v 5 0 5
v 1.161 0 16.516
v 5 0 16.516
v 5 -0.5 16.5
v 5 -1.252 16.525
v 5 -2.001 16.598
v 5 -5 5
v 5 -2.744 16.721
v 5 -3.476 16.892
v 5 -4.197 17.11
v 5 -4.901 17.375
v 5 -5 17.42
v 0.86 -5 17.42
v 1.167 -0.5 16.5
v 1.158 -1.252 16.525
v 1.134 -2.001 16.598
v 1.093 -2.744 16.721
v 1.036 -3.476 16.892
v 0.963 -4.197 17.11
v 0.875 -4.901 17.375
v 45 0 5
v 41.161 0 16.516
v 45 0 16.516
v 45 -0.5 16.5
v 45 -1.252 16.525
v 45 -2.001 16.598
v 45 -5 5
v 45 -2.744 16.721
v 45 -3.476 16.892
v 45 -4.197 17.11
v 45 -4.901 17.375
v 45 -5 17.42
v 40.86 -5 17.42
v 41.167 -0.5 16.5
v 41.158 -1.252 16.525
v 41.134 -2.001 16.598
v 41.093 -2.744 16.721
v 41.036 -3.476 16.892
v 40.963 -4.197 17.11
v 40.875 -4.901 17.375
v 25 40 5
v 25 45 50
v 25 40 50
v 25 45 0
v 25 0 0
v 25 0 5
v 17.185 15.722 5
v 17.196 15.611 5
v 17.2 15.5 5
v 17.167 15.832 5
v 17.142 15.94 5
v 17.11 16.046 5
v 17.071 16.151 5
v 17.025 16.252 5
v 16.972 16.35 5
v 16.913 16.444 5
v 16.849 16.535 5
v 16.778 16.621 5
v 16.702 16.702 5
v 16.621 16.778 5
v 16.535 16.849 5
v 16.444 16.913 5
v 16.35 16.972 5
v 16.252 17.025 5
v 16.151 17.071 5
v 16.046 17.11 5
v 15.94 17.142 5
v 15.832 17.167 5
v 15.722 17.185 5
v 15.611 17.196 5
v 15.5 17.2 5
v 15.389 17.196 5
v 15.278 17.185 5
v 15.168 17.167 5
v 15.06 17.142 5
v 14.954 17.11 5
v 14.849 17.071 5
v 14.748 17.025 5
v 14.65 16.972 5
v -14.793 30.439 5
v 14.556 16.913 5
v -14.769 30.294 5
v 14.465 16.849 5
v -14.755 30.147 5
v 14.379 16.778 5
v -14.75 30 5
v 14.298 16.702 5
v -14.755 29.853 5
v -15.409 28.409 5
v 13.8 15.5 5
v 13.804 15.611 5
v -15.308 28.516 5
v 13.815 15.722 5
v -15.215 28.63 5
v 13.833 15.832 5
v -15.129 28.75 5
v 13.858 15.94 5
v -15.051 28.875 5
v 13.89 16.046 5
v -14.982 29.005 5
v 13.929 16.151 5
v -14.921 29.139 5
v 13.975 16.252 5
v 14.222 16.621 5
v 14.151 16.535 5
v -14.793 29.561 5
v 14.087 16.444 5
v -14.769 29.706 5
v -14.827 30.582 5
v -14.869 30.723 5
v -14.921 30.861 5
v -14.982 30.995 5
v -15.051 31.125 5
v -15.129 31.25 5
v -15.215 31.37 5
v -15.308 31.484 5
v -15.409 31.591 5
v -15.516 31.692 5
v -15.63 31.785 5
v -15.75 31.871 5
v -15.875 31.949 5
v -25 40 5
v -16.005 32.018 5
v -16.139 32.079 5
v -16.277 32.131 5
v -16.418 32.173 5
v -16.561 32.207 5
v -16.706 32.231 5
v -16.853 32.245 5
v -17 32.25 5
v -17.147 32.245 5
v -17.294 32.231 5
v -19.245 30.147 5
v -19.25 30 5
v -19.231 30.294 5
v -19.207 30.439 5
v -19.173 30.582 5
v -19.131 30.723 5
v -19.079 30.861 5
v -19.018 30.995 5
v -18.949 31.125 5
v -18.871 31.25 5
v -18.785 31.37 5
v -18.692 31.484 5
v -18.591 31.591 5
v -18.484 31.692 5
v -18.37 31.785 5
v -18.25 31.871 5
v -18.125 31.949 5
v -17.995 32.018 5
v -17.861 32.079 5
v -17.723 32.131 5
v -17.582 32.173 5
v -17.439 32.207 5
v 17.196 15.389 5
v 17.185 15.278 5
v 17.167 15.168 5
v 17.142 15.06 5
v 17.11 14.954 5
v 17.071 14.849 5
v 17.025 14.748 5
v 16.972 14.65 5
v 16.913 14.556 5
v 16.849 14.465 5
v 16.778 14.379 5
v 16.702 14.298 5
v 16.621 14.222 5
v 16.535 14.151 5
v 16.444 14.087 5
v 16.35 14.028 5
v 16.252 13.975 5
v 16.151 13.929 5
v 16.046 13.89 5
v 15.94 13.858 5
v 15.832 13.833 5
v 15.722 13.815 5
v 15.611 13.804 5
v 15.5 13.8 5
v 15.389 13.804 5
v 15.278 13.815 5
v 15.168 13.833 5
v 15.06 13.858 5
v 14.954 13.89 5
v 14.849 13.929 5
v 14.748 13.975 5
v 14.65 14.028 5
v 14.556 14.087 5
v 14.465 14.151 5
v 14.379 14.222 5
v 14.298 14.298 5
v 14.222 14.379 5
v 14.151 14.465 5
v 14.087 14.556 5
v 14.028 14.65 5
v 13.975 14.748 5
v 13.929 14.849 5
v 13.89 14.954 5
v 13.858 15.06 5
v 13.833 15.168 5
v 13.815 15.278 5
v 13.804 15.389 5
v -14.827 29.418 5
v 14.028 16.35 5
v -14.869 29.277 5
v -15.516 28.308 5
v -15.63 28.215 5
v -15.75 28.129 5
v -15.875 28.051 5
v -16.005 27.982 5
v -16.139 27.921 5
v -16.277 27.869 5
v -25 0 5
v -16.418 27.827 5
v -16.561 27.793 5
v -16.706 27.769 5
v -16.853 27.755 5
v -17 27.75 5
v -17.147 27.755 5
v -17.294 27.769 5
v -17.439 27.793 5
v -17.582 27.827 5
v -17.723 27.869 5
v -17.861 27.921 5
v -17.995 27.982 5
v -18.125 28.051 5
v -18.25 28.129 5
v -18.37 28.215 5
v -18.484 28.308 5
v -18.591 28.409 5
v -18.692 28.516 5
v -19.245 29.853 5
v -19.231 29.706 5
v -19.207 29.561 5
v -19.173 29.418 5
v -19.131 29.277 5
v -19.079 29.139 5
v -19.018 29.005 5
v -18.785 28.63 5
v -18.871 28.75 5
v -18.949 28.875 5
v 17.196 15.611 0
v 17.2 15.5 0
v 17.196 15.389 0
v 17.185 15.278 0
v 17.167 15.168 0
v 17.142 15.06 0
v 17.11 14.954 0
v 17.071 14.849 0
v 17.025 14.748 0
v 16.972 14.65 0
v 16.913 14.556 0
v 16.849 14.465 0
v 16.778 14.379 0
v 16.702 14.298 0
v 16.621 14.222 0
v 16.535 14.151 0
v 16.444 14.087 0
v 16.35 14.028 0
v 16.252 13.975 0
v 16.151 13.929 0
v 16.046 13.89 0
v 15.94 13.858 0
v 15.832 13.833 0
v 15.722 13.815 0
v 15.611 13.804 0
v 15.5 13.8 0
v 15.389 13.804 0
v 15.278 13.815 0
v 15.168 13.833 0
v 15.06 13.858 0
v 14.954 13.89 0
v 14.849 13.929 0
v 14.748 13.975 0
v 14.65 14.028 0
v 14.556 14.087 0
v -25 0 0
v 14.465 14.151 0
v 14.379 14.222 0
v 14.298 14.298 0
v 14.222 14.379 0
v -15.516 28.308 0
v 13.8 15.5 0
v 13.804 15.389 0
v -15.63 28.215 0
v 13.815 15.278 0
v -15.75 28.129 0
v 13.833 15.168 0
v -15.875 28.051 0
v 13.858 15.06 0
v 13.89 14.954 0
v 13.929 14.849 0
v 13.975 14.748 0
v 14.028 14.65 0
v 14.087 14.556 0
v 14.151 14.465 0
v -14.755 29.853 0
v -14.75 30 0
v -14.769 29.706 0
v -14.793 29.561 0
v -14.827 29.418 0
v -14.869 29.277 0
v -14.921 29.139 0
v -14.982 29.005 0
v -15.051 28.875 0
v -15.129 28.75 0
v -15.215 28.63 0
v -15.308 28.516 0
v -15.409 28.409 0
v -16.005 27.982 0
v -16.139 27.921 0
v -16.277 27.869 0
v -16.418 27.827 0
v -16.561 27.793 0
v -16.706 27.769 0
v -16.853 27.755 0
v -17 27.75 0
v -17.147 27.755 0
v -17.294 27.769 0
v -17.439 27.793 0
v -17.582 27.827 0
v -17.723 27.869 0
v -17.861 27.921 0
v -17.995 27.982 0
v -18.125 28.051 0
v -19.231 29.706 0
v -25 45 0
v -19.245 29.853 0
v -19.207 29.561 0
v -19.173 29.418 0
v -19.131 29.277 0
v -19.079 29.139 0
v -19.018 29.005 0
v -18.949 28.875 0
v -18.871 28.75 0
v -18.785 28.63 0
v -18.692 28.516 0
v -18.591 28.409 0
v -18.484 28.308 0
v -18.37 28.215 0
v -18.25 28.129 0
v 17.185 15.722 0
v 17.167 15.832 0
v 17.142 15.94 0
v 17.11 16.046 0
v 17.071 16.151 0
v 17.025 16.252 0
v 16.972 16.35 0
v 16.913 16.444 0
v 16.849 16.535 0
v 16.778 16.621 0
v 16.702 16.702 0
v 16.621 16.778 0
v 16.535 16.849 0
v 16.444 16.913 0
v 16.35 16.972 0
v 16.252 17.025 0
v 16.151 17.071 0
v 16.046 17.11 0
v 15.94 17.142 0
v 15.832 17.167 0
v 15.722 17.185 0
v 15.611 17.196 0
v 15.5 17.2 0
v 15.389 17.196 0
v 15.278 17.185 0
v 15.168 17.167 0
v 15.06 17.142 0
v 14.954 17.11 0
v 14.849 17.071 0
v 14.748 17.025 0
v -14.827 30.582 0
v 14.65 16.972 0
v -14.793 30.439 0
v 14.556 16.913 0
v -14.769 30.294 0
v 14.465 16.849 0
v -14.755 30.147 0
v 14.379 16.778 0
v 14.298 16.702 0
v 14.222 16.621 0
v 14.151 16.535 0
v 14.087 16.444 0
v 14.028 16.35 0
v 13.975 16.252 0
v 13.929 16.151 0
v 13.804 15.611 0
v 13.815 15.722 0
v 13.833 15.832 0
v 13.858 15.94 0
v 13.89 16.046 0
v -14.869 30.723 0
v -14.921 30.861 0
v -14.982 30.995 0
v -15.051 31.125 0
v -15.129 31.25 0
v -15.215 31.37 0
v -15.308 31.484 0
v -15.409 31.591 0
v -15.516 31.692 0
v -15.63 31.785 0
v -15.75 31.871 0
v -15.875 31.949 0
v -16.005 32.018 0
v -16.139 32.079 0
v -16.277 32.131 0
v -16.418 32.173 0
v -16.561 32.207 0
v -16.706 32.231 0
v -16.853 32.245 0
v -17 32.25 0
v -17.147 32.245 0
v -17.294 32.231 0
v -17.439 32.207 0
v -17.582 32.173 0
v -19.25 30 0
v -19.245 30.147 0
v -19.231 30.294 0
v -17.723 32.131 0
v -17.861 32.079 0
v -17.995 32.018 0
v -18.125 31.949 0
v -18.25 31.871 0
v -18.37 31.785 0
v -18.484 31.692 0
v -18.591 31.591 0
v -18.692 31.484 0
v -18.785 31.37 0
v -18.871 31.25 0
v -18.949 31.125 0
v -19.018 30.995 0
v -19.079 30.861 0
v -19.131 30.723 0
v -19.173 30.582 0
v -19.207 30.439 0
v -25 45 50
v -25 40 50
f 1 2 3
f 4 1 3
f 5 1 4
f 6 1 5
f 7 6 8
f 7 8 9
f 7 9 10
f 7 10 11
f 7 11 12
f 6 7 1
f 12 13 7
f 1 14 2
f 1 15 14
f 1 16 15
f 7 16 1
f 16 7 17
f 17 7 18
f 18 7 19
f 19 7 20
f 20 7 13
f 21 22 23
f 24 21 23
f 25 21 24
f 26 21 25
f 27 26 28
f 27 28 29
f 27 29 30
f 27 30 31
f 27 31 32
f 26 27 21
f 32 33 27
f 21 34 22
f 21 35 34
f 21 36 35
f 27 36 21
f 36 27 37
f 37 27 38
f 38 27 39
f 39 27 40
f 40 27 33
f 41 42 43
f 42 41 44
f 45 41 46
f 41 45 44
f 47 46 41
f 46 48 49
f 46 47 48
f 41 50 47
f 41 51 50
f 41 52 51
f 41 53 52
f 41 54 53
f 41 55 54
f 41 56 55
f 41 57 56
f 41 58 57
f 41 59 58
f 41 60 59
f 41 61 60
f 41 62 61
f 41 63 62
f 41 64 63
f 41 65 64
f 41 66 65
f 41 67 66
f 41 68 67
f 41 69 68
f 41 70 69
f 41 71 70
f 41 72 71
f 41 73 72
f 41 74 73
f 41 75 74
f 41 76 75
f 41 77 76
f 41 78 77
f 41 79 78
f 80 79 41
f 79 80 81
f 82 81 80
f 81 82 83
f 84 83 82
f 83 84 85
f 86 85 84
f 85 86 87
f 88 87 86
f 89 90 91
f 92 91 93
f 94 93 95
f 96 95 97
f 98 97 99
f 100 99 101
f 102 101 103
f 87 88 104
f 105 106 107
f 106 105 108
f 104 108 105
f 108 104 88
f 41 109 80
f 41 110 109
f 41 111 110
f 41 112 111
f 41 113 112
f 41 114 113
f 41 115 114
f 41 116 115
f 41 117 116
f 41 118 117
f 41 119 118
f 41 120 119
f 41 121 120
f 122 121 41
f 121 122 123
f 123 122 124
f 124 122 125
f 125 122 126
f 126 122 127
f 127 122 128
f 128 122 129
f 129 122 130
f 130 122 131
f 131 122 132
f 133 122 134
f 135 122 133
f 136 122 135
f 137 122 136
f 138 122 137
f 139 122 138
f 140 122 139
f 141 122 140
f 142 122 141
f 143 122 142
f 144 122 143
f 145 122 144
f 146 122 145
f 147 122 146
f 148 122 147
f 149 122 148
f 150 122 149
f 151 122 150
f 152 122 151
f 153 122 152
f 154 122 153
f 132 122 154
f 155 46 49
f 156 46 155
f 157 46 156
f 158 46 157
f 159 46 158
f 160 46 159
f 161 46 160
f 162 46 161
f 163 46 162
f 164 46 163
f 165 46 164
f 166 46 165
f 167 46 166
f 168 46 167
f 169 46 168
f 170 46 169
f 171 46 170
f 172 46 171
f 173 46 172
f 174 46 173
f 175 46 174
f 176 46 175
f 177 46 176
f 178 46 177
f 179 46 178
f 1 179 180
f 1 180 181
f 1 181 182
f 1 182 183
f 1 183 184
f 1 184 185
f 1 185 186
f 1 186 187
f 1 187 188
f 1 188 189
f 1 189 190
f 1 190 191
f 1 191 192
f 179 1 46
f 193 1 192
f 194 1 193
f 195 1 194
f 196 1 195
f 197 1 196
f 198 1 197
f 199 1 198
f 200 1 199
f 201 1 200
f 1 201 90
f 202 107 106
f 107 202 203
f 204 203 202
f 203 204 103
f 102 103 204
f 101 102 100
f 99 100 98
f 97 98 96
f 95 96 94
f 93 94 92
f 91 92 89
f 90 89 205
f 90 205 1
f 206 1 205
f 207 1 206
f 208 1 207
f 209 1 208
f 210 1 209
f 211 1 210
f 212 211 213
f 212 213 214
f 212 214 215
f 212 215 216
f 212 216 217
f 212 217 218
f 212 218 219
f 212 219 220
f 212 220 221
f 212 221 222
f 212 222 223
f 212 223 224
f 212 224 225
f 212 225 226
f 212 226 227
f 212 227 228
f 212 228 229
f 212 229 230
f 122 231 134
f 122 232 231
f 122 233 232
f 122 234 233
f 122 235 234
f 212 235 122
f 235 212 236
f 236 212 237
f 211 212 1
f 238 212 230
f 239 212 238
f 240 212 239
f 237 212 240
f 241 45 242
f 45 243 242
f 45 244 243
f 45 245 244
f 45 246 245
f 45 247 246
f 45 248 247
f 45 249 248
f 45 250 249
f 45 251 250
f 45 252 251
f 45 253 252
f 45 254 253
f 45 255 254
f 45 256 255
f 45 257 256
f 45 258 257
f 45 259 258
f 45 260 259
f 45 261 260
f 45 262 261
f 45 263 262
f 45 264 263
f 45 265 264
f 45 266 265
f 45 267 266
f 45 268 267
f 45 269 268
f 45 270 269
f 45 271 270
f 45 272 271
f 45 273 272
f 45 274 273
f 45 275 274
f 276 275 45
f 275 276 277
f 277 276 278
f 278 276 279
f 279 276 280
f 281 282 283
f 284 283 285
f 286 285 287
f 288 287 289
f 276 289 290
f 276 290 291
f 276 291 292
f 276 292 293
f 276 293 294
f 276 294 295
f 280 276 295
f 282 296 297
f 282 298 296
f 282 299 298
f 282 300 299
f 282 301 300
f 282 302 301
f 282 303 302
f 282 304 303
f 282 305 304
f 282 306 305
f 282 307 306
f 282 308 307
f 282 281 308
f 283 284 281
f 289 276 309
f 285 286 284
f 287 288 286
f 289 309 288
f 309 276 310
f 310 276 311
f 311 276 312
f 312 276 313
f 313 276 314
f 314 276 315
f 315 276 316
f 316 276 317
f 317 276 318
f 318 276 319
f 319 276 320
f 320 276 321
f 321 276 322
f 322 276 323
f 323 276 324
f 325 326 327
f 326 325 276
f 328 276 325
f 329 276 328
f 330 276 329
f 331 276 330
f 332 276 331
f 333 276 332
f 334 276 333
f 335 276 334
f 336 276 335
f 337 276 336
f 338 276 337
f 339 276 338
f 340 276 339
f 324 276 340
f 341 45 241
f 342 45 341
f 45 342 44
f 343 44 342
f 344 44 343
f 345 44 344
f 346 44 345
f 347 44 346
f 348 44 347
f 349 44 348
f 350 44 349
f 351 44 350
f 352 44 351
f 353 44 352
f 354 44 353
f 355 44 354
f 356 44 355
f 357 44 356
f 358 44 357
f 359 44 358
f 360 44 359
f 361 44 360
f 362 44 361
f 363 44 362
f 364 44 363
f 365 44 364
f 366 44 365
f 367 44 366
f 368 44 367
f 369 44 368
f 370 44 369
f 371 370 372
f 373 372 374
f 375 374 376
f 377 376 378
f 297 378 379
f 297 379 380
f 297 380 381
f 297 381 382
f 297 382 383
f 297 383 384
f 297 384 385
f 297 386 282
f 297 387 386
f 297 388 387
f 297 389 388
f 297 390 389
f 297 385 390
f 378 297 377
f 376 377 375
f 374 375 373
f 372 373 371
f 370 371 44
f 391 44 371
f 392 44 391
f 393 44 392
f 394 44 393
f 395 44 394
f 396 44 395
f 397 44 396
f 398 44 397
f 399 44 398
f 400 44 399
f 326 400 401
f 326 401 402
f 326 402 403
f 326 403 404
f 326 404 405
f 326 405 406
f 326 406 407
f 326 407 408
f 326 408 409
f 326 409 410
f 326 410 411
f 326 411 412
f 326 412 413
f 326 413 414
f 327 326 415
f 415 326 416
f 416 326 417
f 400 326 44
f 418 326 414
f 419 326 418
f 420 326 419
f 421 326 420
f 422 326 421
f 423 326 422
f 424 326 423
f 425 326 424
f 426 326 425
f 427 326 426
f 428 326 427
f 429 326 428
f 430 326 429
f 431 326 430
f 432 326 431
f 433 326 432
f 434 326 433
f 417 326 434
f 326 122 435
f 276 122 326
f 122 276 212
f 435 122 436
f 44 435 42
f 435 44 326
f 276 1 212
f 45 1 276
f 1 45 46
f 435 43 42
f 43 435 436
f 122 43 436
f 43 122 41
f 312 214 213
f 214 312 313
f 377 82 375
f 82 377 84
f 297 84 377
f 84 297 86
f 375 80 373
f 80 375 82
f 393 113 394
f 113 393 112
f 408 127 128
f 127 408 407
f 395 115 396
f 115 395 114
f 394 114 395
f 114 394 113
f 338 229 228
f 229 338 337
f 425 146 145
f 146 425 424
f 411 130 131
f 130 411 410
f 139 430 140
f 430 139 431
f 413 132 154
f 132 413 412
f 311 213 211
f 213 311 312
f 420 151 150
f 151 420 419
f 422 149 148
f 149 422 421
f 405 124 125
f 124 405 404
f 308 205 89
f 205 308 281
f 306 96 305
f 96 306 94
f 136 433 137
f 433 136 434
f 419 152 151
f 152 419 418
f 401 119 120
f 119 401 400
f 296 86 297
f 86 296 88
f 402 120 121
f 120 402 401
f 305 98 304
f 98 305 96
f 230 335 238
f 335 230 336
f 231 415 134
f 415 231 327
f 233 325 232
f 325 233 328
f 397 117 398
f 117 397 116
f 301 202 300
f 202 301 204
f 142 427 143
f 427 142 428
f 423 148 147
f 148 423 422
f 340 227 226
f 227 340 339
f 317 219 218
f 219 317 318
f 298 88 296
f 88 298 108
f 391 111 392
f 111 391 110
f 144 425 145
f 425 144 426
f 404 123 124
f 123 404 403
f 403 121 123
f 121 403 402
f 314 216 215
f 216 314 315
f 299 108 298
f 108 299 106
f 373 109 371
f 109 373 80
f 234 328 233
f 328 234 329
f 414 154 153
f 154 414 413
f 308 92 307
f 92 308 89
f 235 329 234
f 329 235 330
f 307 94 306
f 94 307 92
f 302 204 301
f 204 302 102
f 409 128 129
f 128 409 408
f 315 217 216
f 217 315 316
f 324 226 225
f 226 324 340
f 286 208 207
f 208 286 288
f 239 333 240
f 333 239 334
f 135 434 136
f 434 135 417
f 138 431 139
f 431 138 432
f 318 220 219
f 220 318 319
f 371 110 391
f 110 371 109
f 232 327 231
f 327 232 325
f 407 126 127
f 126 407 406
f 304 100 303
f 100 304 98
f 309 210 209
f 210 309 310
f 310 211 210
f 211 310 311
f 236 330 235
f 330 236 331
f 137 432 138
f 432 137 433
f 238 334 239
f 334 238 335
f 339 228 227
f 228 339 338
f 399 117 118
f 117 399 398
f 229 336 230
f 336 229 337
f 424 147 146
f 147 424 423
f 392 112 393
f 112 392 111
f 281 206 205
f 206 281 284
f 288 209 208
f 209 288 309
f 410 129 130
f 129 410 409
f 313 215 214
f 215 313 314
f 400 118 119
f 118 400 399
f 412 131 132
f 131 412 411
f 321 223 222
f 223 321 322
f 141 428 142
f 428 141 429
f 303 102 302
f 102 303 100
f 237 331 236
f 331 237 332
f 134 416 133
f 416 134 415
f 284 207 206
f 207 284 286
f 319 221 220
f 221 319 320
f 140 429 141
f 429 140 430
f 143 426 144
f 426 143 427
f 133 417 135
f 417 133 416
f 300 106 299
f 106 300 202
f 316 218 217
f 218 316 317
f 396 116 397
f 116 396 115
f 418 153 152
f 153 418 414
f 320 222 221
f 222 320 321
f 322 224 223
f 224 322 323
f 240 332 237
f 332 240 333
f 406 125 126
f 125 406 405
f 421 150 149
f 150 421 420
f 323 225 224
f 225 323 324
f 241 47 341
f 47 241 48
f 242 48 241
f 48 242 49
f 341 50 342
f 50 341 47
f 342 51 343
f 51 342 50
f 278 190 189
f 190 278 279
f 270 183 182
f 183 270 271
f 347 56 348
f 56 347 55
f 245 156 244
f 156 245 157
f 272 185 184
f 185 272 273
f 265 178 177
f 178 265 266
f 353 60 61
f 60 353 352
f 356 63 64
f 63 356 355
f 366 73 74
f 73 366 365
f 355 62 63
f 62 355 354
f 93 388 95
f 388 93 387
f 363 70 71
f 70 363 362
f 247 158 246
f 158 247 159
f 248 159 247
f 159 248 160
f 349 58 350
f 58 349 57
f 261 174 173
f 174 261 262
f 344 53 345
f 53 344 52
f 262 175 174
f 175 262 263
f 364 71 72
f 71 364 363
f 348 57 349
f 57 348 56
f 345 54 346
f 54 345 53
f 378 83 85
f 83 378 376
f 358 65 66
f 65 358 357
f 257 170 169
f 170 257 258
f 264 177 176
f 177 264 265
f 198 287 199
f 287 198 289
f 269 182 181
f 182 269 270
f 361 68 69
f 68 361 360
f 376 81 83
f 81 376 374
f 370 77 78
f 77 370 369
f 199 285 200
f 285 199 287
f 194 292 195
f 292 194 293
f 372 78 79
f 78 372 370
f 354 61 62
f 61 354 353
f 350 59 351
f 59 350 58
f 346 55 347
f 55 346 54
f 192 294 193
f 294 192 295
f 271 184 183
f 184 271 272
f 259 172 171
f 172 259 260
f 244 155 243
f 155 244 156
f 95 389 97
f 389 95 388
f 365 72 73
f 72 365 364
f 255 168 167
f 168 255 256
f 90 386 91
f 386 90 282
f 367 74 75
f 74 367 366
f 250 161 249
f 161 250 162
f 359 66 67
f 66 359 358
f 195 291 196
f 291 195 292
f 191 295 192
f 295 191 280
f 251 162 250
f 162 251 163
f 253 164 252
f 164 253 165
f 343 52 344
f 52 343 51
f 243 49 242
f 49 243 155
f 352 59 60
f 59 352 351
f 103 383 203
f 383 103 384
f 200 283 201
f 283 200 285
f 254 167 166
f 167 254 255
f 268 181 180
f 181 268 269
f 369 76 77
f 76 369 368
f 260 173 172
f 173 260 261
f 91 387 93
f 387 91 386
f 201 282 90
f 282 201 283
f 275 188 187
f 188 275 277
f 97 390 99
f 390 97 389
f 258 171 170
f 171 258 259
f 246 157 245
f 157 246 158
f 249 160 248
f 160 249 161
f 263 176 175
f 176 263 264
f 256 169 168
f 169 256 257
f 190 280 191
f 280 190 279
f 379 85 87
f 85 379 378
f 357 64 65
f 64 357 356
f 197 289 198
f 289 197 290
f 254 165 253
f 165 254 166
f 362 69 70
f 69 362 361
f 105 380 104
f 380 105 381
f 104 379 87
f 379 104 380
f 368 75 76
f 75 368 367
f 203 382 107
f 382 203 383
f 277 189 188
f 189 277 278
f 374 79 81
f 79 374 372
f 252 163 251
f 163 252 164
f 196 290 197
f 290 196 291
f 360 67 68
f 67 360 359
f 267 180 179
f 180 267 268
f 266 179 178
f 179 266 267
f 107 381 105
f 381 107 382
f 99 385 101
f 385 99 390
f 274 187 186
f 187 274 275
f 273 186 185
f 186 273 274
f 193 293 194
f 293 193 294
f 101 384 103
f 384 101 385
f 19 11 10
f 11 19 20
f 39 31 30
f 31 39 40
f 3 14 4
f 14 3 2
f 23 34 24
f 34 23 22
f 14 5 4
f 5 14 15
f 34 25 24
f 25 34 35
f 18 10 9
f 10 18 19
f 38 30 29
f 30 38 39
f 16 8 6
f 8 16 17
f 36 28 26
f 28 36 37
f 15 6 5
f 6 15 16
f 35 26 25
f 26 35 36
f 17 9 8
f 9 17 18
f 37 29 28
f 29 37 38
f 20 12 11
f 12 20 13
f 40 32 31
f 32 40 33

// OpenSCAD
// L-shaped mounting bracket for a NEMA 17 stepper motor
// Print orientation: base plate flat on the bed, vertical plate upright

// ---------------- Parameters ----------------
base_x       = 25;    // base plate length in X (from -25 to +25)
base_y       = 45;    // base plate length in Y (from 0 to 45)
base_t       = 5;     // base plate thickness in Z (0 to 5)

motor_pl_h   = 50;    // vertical motor plate height in Z (0 to 50)
motor_pl_y   = 5;     // vertical plate thickness in Y (0 to 5)

boss_d       = 23;    // diameter of motor centring boss hole
boss_x       = 0;     // boss hole centre X
boss_z       = 28;    // boss hole centre Z

screw_d      = 3.4;   // M3 screw hole diameter
screw_p      = 31;    // side of square screw pattern
screw_n      = 4;     // number of screw holes

gusset_t     = 5;     // gusset thickness in X
gusset_y     = 20;    // gusset leg along +Y
gusset_z     = 20;    // gusset leg along +Z

eps          = 0.5;   // cutter overshoot past faces

$fn = 96;

// ---------------- Model ----------------
difference() {
    union() {
        // Base plate
        translate([-base_x, 0, 0])
            cube([base_x * 2, base_y, base_t]);

        // Vertical motor plate
        translate([-base_x, base_y - motor_pl_y, 0])
            cube([base_x * 2, motor_pl_y, motor_pl_h]);

        // Gussets: right triangles in YZ, flush with left/right edges
        for (sx = [-1, 1])
            translate([sx * (base_x - gusset_t), 0, 0])
                rotate([90, 0, 0])
                    linear_extrude(height = gusset_t)
                        polygon([[gusset_y, gusset_z],
                                 [base_x, gusset_z],
                                 [base_x, motor_pl_y]]);
    }

    // Base plate through-holes (M4)
    for (h = [base_t + eps, motor_pl_h + eps])
        translate([-17, 30, -eps])
            cylinder(d = 4.5, h = h);

    // Boss hole along Y
    translate([boss_x, -eps, boss_z])
        rotate([0, 90, 0])
            cylinder(d = boss_d, h = base_y + 2 * eps);

    // Screw holes on square pattern
    for (i = [0 : screw_n - 1])
        translate([(i - (screw_n - 1) / 2) * screw_p,
                   (i - (screw_n - 1) / 2) * screw_p,
                   -eps])
            cylinder(d = screw_d, h = motor_pl_h + 2 * eps);
}
